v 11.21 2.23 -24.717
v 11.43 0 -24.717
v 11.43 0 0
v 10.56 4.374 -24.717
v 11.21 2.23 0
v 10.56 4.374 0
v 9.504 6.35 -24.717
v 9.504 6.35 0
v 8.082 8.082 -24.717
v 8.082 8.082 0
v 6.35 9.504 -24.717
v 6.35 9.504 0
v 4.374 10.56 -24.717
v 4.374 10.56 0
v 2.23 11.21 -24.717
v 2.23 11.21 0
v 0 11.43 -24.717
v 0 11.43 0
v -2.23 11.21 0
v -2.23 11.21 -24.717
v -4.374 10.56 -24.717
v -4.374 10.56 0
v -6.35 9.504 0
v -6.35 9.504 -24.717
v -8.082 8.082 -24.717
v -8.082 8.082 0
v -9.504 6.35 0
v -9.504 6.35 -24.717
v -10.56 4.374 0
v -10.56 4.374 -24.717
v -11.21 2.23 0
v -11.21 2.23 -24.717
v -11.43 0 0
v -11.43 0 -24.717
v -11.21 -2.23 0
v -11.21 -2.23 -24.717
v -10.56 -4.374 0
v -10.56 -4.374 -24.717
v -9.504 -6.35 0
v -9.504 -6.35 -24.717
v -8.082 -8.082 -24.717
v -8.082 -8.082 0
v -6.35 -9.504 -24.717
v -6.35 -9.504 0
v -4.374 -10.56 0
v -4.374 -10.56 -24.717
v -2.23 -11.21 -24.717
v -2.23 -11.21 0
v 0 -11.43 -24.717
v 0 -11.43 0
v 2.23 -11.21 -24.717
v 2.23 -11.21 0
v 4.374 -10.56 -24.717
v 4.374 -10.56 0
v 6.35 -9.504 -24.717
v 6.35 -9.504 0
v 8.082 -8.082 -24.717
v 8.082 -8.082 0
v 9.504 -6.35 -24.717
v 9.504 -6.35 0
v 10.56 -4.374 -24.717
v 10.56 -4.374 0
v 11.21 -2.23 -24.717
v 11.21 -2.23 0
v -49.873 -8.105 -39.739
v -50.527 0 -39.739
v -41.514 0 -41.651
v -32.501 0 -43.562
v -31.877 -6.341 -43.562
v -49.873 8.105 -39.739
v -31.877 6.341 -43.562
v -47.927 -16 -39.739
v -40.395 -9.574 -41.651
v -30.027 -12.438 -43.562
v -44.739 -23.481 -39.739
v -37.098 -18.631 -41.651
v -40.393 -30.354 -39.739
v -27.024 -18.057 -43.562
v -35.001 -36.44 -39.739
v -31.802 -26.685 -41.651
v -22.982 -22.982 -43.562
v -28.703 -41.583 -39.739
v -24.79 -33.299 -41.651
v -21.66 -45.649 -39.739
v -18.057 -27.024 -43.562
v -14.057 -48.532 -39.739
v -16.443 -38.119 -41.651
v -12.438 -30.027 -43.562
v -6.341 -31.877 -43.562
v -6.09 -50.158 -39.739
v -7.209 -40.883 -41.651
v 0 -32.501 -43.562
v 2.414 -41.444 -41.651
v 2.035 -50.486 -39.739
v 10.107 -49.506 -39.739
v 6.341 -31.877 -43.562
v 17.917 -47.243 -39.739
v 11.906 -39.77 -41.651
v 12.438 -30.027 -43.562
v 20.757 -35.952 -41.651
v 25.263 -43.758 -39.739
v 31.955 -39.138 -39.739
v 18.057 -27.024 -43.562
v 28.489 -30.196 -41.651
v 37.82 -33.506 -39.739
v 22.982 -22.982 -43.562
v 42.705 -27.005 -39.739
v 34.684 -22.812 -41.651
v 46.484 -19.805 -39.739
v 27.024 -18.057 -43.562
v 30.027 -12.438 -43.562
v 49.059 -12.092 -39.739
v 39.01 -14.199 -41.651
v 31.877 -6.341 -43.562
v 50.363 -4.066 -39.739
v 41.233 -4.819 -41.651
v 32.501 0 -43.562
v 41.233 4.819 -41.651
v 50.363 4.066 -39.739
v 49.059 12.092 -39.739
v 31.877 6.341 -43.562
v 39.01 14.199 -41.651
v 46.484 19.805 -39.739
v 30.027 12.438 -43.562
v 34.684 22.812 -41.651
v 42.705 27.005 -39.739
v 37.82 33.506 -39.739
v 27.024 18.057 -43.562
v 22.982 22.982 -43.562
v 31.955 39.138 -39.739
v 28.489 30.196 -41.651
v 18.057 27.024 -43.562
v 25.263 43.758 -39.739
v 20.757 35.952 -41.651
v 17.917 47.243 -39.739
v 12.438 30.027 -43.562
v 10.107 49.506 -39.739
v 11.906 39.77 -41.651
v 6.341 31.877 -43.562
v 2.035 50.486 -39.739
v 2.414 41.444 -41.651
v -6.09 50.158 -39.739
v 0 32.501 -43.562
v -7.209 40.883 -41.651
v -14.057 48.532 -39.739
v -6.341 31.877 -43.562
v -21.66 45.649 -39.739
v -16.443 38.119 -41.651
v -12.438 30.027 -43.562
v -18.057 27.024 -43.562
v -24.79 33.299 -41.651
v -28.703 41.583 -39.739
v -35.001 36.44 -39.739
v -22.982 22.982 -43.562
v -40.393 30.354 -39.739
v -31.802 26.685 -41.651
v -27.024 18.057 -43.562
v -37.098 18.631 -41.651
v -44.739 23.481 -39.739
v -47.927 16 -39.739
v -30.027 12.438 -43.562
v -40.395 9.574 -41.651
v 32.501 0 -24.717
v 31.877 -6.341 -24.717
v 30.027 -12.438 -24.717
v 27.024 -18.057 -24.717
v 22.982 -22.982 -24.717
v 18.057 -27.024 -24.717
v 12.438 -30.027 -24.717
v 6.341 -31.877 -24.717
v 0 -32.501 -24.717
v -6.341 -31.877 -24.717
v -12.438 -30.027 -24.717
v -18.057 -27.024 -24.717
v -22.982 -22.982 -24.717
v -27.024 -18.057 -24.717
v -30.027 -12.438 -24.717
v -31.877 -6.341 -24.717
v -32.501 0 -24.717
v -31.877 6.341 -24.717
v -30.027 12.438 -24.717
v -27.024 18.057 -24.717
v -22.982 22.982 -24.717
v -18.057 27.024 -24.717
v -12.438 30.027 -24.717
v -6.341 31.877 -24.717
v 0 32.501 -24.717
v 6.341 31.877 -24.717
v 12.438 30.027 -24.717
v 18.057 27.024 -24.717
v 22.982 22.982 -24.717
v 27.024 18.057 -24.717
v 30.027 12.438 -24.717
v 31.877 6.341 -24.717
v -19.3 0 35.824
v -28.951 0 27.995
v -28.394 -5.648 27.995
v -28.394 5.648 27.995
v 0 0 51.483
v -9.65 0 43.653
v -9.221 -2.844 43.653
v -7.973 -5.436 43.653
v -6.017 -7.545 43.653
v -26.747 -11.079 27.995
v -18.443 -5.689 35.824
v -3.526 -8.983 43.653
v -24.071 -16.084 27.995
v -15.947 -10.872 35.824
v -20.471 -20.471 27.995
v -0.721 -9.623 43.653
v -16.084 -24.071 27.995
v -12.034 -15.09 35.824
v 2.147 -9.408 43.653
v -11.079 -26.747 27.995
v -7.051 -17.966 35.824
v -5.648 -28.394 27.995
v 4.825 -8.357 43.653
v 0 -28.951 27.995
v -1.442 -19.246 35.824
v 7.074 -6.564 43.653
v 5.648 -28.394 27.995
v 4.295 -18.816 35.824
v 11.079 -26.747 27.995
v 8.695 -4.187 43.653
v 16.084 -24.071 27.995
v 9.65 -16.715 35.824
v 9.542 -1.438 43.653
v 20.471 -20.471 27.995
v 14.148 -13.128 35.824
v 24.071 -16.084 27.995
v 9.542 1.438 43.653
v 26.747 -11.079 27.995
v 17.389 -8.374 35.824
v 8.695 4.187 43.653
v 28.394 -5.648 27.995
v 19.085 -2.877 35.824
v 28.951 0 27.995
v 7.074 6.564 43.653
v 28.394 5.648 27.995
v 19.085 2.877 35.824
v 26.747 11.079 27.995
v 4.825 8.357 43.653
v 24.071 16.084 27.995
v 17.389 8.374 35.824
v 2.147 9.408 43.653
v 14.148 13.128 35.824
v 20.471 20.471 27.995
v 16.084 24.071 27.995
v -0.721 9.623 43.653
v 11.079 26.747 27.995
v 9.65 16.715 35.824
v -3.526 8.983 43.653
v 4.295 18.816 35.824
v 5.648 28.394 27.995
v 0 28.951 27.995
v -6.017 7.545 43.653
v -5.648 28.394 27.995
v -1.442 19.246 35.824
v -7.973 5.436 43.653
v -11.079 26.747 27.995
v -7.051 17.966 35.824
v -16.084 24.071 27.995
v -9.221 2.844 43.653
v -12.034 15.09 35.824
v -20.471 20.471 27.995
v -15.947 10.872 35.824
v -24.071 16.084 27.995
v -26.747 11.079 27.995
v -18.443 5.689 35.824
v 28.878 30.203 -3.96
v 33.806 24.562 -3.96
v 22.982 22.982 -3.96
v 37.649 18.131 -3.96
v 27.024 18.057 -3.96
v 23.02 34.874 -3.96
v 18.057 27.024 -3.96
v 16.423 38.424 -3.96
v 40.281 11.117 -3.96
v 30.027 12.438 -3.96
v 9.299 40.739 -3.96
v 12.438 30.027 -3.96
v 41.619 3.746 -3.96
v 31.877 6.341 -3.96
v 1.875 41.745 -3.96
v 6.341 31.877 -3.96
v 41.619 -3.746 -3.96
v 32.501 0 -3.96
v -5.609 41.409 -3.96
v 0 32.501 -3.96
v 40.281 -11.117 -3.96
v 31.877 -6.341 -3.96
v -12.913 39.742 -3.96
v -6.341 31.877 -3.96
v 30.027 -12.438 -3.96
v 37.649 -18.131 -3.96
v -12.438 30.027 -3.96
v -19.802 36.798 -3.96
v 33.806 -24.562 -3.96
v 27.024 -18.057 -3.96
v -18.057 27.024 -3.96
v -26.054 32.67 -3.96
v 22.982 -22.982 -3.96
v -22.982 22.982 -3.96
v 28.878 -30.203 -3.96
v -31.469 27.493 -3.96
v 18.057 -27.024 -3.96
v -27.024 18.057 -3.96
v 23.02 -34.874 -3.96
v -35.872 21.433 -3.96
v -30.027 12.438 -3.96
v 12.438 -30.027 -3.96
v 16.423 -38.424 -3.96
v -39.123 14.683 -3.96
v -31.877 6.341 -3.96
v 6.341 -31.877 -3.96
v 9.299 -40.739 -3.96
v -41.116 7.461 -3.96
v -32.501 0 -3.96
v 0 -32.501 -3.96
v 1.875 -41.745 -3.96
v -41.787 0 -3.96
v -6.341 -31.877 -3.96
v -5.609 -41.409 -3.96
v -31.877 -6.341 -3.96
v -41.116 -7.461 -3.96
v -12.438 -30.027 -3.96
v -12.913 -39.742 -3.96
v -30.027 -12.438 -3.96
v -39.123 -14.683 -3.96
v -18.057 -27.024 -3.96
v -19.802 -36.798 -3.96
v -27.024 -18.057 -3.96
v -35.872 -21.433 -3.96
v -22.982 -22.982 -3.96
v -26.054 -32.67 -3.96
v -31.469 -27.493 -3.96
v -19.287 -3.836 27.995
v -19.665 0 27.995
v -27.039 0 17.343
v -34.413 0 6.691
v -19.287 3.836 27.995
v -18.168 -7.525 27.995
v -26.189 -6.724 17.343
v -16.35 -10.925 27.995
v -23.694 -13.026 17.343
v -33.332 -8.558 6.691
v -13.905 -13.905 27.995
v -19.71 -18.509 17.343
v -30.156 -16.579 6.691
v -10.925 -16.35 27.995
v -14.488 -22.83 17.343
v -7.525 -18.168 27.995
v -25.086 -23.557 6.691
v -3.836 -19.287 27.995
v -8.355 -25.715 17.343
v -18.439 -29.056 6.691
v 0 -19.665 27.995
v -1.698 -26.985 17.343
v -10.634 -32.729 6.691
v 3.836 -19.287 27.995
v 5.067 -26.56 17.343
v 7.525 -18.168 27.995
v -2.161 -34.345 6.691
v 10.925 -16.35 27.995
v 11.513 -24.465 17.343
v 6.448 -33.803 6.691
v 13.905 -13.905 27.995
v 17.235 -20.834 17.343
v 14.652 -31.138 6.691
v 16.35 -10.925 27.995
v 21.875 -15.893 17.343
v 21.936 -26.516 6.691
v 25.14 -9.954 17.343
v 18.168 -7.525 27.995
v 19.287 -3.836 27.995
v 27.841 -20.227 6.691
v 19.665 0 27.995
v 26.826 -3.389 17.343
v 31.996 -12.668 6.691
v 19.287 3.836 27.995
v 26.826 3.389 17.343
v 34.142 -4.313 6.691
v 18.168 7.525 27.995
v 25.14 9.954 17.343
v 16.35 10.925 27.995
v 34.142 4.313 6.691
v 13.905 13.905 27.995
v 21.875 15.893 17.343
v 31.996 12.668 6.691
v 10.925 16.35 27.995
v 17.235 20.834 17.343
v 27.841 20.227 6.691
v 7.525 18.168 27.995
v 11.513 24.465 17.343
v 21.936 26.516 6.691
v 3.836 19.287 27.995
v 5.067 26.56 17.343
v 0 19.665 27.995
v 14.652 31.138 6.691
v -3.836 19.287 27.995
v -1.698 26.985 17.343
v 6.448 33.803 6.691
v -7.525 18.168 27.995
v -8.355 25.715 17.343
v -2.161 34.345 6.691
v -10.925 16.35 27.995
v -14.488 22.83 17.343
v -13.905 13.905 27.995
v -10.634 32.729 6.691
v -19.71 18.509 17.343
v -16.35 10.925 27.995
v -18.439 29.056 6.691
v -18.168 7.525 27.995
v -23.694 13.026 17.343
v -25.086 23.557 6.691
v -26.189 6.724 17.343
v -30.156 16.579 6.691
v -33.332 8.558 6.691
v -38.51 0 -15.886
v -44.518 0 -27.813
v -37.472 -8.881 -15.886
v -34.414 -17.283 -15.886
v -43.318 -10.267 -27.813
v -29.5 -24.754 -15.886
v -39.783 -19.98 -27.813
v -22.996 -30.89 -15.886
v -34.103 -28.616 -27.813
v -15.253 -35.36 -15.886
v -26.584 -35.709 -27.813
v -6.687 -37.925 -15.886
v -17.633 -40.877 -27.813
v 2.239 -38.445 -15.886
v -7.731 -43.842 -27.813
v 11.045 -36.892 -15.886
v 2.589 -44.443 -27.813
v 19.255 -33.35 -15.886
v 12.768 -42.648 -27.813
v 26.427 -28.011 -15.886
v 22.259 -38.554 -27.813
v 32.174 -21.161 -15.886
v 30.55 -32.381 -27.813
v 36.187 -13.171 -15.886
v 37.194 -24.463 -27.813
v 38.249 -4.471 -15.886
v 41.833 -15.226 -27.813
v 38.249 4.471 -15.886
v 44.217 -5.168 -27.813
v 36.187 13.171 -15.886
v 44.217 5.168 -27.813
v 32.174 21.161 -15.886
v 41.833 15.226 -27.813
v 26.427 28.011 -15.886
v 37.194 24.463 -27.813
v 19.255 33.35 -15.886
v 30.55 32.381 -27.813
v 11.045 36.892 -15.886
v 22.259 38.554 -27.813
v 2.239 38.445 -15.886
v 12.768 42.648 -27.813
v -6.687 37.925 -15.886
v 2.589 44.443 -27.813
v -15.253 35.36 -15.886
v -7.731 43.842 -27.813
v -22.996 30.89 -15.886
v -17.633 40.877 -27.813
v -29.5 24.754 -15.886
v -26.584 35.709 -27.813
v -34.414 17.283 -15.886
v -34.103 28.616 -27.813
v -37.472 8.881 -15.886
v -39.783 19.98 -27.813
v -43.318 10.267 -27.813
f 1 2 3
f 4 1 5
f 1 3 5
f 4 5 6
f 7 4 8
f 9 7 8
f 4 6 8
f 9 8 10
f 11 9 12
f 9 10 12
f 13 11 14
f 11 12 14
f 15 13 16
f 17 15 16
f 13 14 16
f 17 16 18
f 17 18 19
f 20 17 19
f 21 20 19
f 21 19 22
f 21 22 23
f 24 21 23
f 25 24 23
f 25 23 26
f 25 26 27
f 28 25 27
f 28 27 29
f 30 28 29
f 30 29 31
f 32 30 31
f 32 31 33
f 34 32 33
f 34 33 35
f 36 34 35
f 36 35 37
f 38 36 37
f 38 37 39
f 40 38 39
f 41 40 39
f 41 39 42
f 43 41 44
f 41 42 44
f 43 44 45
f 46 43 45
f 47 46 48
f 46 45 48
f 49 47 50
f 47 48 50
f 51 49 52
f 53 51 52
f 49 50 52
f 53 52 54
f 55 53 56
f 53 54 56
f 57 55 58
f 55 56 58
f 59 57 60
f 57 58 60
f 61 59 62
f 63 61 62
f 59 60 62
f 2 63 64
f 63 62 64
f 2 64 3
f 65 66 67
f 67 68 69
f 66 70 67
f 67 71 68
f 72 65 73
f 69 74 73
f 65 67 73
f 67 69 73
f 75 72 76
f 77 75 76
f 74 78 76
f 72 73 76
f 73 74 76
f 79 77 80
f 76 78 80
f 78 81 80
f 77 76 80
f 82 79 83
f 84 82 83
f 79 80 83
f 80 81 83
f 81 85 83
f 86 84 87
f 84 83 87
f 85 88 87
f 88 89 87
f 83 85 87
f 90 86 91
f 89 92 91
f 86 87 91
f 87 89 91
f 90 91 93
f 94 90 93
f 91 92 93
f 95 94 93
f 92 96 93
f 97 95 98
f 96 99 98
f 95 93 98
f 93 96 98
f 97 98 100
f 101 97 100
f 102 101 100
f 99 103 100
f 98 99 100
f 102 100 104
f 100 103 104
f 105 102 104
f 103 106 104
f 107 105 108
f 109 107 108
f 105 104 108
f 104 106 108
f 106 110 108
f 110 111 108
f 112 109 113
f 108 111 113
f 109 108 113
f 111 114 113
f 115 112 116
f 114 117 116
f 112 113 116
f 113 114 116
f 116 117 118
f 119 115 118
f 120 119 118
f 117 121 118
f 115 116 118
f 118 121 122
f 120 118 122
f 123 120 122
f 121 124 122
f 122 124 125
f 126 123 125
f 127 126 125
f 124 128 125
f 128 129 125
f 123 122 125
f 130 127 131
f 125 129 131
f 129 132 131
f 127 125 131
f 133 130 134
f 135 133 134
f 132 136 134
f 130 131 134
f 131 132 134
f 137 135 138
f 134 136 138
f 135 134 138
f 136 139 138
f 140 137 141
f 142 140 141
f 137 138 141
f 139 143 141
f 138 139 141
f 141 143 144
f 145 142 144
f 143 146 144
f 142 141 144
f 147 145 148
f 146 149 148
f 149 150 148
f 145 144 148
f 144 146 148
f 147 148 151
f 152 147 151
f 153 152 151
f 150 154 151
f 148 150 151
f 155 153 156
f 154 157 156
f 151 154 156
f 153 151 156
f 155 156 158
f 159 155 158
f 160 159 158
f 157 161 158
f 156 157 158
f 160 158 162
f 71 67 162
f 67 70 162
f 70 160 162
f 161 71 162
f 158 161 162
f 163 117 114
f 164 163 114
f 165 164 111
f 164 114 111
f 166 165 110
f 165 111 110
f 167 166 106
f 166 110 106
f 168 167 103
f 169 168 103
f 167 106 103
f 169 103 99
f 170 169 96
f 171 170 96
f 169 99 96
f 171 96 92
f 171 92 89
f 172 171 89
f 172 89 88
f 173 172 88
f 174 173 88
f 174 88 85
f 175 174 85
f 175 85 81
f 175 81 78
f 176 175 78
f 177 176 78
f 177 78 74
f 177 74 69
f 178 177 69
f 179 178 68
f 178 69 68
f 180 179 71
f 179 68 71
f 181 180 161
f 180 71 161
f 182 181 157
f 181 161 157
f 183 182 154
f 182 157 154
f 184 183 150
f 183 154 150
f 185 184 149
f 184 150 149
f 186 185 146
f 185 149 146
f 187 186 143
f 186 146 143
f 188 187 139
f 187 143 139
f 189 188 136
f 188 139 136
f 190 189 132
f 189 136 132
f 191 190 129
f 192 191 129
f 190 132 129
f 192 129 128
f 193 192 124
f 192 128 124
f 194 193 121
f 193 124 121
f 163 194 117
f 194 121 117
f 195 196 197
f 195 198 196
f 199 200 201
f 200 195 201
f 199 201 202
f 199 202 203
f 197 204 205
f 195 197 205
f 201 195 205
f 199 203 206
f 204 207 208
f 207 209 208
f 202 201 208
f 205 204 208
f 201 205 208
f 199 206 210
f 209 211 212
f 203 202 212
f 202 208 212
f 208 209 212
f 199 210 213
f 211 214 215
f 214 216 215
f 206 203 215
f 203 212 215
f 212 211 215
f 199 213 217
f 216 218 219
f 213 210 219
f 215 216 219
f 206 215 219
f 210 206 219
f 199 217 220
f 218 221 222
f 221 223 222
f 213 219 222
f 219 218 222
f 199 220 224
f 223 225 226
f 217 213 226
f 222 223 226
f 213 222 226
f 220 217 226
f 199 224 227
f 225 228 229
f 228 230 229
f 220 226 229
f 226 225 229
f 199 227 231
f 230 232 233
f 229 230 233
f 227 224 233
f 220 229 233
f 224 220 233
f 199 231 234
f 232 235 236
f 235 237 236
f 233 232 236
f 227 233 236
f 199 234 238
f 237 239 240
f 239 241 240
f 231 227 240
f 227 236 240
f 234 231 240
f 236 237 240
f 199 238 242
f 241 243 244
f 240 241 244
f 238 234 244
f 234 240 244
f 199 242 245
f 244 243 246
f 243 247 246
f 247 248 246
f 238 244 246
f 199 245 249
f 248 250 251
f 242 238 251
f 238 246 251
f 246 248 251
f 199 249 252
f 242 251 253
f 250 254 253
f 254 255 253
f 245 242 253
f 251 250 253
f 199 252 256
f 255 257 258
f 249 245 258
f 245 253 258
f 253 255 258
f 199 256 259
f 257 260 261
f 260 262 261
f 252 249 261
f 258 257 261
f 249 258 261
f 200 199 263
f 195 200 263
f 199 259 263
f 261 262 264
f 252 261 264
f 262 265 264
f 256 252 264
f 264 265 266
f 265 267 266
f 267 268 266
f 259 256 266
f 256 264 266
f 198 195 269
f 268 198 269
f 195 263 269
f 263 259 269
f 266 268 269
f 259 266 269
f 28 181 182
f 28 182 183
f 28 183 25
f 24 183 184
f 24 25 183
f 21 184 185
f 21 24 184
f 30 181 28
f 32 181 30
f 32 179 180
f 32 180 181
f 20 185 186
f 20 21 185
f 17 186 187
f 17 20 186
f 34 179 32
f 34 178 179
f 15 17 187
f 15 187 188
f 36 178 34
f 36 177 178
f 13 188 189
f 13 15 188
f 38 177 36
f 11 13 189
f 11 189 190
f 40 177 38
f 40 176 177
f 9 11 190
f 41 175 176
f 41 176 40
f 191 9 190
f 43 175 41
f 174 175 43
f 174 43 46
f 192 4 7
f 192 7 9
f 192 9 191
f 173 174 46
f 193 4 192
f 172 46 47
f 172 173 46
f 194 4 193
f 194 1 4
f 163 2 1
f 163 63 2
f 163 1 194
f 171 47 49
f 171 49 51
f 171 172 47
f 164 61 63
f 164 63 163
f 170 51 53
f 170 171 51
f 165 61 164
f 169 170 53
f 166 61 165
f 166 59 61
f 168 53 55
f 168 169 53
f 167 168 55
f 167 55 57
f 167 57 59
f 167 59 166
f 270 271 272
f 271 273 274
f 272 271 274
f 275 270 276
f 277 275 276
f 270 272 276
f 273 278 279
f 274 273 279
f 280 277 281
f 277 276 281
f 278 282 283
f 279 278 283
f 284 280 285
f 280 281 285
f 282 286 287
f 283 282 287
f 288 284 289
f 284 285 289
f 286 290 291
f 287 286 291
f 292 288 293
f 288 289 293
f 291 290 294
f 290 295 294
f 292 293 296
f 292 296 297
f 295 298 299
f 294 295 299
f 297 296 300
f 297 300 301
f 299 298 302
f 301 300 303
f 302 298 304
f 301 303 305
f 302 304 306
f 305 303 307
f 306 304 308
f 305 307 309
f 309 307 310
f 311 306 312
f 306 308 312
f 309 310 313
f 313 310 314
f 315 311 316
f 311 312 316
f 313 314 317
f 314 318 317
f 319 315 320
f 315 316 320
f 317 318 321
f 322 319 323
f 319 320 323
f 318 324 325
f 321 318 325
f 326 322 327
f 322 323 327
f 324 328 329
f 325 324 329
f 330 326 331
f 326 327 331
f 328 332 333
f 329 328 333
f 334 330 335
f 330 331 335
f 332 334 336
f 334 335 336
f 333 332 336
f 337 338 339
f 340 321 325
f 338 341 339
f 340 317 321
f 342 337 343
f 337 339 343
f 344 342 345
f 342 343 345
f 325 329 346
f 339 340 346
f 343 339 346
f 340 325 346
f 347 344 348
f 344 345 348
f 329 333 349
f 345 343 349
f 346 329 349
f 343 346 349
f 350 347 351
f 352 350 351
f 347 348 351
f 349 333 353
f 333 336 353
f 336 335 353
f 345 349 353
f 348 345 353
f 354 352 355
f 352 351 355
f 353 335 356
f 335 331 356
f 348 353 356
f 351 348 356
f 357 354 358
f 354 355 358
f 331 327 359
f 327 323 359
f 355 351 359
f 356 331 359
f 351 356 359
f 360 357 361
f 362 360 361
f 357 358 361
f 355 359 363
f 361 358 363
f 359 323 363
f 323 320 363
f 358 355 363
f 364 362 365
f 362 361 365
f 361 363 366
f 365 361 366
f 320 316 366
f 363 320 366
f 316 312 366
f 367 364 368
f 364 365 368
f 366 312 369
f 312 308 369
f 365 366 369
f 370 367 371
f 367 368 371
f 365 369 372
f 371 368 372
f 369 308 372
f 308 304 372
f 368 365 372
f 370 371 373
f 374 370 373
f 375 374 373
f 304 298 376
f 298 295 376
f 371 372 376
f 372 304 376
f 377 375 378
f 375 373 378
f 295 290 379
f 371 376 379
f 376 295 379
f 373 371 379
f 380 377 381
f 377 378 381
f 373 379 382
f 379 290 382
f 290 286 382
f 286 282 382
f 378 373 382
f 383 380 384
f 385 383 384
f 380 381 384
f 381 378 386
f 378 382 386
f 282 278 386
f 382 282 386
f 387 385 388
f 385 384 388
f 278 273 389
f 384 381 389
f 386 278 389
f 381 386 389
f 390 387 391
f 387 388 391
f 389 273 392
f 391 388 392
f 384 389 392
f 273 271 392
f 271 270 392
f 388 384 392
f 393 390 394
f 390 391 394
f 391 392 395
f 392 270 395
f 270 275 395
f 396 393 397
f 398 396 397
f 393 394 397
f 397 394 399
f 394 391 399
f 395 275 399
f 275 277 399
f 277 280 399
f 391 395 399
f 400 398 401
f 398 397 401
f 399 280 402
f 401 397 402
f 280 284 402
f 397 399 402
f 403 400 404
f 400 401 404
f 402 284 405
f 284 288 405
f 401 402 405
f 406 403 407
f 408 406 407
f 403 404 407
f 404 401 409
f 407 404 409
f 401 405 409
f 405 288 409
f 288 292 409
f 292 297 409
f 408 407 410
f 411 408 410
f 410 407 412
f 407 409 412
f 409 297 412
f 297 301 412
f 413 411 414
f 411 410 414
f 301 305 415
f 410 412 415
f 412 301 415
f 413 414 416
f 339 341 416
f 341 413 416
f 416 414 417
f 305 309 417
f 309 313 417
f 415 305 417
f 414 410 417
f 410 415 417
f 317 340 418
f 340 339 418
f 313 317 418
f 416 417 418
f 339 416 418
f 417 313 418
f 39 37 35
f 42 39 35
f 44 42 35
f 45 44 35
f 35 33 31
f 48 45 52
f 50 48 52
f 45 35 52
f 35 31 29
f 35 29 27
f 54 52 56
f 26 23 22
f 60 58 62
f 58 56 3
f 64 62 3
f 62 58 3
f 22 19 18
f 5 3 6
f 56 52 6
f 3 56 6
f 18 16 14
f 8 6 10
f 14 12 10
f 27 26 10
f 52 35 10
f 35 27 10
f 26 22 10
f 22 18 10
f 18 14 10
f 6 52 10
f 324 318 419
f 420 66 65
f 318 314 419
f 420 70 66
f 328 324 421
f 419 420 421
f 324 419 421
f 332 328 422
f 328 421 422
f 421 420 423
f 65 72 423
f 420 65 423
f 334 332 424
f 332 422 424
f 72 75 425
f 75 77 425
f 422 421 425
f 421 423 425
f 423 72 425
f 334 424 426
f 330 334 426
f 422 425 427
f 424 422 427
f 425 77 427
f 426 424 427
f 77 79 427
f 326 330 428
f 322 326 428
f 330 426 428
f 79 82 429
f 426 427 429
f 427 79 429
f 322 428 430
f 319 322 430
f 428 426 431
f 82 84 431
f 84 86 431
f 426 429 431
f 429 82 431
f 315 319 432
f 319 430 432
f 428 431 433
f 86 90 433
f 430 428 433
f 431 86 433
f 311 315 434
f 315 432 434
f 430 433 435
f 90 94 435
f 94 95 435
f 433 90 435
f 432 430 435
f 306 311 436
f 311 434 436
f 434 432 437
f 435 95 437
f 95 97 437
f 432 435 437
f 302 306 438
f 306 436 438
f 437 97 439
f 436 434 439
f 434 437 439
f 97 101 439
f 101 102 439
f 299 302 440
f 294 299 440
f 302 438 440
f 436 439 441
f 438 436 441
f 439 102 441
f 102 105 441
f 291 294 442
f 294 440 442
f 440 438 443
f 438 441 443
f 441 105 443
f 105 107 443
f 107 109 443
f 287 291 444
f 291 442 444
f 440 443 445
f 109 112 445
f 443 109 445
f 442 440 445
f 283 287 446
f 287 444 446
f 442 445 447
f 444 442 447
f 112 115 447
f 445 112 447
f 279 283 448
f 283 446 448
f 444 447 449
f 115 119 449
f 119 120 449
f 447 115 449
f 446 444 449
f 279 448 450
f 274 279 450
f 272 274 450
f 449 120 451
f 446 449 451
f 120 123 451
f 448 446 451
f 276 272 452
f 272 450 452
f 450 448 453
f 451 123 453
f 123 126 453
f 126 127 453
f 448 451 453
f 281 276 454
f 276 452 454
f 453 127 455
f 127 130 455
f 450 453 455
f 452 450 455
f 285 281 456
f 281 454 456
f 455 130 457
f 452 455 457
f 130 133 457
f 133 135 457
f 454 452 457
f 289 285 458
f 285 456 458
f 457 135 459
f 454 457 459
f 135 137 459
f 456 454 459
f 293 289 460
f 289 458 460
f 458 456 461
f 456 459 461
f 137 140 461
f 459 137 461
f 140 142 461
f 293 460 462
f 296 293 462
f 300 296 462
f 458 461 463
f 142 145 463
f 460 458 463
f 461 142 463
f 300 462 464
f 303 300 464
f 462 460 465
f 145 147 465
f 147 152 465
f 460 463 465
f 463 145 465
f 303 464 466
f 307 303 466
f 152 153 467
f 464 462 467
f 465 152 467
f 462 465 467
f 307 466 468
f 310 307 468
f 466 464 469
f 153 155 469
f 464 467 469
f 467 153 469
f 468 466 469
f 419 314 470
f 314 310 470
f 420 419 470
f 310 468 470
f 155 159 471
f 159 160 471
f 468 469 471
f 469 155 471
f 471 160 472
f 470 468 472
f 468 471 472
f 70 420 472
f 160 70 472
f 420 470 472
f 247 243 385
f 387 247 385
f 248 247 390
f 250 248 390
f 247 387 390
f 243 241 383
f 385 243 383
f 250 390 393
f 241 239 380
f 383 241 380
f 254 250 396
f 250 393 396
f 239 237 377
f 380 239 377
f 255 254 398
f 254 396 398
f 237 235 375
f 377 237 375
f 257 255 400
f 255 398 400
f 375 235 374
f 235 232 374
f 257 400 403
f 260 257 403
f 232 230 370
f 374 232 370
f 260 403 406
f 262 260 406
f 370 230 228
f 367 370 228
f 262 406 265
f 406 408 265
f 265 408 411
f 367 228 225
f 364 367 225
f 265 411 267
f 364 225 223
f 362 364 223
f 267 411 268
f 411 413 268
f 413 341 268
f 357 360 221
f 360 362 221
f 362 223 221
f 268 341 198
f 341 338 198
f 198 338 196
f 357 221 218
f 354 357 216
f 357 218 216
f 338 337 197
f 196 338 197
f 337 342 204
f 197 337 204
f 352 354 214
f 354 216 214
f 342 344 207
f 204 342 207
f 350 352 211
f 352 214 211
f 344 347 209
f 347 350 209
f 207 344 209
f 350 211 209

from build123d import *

# Parameters (mm, degrees)
F1_FACE_R = 32.501076
F2_DEPTH  = 25.4
F3_R      = 11.43
F4_DEPTH  = 84.328


with BuildPart() as f1:
    # F0 (on Front) → F1 (revolve)
    with BuildSketch(Plane.XZ):
        Polygon((0, -50.117204), (0, 51.482796), (-28.950538, 27.994625), (-19.664516, 27.994625), (-41.787097, -3.960215), (-32.501076, -3.960215), (-50.526883, -39.738708), (-32.501076, -43.562369), (-32.501076, -50.117204), align=None)
    revolve(axis=Axis((0, 0, 0.682796), (0, 0, 1)))

    # F1_face (on face) → F2 (cut)
    with BuildSketch(Plane(origin=(0, 0, -50.117204), x_dir=(1, 0, 0), z_dir=(0, 0, -1))):
        Circle(F1_FACE_R)
    extrude(amount=-F2_DEPTH, mode=Mode.SUBTRACT)

    # F3 (on Top) → F4 (cut)
    with BuildSketch(Plane.XY):
        Circle(F3_R)
    extrude(amount=-F4_DEPTH, mode=Mode.SUBTRACT)


solid = f1.part
